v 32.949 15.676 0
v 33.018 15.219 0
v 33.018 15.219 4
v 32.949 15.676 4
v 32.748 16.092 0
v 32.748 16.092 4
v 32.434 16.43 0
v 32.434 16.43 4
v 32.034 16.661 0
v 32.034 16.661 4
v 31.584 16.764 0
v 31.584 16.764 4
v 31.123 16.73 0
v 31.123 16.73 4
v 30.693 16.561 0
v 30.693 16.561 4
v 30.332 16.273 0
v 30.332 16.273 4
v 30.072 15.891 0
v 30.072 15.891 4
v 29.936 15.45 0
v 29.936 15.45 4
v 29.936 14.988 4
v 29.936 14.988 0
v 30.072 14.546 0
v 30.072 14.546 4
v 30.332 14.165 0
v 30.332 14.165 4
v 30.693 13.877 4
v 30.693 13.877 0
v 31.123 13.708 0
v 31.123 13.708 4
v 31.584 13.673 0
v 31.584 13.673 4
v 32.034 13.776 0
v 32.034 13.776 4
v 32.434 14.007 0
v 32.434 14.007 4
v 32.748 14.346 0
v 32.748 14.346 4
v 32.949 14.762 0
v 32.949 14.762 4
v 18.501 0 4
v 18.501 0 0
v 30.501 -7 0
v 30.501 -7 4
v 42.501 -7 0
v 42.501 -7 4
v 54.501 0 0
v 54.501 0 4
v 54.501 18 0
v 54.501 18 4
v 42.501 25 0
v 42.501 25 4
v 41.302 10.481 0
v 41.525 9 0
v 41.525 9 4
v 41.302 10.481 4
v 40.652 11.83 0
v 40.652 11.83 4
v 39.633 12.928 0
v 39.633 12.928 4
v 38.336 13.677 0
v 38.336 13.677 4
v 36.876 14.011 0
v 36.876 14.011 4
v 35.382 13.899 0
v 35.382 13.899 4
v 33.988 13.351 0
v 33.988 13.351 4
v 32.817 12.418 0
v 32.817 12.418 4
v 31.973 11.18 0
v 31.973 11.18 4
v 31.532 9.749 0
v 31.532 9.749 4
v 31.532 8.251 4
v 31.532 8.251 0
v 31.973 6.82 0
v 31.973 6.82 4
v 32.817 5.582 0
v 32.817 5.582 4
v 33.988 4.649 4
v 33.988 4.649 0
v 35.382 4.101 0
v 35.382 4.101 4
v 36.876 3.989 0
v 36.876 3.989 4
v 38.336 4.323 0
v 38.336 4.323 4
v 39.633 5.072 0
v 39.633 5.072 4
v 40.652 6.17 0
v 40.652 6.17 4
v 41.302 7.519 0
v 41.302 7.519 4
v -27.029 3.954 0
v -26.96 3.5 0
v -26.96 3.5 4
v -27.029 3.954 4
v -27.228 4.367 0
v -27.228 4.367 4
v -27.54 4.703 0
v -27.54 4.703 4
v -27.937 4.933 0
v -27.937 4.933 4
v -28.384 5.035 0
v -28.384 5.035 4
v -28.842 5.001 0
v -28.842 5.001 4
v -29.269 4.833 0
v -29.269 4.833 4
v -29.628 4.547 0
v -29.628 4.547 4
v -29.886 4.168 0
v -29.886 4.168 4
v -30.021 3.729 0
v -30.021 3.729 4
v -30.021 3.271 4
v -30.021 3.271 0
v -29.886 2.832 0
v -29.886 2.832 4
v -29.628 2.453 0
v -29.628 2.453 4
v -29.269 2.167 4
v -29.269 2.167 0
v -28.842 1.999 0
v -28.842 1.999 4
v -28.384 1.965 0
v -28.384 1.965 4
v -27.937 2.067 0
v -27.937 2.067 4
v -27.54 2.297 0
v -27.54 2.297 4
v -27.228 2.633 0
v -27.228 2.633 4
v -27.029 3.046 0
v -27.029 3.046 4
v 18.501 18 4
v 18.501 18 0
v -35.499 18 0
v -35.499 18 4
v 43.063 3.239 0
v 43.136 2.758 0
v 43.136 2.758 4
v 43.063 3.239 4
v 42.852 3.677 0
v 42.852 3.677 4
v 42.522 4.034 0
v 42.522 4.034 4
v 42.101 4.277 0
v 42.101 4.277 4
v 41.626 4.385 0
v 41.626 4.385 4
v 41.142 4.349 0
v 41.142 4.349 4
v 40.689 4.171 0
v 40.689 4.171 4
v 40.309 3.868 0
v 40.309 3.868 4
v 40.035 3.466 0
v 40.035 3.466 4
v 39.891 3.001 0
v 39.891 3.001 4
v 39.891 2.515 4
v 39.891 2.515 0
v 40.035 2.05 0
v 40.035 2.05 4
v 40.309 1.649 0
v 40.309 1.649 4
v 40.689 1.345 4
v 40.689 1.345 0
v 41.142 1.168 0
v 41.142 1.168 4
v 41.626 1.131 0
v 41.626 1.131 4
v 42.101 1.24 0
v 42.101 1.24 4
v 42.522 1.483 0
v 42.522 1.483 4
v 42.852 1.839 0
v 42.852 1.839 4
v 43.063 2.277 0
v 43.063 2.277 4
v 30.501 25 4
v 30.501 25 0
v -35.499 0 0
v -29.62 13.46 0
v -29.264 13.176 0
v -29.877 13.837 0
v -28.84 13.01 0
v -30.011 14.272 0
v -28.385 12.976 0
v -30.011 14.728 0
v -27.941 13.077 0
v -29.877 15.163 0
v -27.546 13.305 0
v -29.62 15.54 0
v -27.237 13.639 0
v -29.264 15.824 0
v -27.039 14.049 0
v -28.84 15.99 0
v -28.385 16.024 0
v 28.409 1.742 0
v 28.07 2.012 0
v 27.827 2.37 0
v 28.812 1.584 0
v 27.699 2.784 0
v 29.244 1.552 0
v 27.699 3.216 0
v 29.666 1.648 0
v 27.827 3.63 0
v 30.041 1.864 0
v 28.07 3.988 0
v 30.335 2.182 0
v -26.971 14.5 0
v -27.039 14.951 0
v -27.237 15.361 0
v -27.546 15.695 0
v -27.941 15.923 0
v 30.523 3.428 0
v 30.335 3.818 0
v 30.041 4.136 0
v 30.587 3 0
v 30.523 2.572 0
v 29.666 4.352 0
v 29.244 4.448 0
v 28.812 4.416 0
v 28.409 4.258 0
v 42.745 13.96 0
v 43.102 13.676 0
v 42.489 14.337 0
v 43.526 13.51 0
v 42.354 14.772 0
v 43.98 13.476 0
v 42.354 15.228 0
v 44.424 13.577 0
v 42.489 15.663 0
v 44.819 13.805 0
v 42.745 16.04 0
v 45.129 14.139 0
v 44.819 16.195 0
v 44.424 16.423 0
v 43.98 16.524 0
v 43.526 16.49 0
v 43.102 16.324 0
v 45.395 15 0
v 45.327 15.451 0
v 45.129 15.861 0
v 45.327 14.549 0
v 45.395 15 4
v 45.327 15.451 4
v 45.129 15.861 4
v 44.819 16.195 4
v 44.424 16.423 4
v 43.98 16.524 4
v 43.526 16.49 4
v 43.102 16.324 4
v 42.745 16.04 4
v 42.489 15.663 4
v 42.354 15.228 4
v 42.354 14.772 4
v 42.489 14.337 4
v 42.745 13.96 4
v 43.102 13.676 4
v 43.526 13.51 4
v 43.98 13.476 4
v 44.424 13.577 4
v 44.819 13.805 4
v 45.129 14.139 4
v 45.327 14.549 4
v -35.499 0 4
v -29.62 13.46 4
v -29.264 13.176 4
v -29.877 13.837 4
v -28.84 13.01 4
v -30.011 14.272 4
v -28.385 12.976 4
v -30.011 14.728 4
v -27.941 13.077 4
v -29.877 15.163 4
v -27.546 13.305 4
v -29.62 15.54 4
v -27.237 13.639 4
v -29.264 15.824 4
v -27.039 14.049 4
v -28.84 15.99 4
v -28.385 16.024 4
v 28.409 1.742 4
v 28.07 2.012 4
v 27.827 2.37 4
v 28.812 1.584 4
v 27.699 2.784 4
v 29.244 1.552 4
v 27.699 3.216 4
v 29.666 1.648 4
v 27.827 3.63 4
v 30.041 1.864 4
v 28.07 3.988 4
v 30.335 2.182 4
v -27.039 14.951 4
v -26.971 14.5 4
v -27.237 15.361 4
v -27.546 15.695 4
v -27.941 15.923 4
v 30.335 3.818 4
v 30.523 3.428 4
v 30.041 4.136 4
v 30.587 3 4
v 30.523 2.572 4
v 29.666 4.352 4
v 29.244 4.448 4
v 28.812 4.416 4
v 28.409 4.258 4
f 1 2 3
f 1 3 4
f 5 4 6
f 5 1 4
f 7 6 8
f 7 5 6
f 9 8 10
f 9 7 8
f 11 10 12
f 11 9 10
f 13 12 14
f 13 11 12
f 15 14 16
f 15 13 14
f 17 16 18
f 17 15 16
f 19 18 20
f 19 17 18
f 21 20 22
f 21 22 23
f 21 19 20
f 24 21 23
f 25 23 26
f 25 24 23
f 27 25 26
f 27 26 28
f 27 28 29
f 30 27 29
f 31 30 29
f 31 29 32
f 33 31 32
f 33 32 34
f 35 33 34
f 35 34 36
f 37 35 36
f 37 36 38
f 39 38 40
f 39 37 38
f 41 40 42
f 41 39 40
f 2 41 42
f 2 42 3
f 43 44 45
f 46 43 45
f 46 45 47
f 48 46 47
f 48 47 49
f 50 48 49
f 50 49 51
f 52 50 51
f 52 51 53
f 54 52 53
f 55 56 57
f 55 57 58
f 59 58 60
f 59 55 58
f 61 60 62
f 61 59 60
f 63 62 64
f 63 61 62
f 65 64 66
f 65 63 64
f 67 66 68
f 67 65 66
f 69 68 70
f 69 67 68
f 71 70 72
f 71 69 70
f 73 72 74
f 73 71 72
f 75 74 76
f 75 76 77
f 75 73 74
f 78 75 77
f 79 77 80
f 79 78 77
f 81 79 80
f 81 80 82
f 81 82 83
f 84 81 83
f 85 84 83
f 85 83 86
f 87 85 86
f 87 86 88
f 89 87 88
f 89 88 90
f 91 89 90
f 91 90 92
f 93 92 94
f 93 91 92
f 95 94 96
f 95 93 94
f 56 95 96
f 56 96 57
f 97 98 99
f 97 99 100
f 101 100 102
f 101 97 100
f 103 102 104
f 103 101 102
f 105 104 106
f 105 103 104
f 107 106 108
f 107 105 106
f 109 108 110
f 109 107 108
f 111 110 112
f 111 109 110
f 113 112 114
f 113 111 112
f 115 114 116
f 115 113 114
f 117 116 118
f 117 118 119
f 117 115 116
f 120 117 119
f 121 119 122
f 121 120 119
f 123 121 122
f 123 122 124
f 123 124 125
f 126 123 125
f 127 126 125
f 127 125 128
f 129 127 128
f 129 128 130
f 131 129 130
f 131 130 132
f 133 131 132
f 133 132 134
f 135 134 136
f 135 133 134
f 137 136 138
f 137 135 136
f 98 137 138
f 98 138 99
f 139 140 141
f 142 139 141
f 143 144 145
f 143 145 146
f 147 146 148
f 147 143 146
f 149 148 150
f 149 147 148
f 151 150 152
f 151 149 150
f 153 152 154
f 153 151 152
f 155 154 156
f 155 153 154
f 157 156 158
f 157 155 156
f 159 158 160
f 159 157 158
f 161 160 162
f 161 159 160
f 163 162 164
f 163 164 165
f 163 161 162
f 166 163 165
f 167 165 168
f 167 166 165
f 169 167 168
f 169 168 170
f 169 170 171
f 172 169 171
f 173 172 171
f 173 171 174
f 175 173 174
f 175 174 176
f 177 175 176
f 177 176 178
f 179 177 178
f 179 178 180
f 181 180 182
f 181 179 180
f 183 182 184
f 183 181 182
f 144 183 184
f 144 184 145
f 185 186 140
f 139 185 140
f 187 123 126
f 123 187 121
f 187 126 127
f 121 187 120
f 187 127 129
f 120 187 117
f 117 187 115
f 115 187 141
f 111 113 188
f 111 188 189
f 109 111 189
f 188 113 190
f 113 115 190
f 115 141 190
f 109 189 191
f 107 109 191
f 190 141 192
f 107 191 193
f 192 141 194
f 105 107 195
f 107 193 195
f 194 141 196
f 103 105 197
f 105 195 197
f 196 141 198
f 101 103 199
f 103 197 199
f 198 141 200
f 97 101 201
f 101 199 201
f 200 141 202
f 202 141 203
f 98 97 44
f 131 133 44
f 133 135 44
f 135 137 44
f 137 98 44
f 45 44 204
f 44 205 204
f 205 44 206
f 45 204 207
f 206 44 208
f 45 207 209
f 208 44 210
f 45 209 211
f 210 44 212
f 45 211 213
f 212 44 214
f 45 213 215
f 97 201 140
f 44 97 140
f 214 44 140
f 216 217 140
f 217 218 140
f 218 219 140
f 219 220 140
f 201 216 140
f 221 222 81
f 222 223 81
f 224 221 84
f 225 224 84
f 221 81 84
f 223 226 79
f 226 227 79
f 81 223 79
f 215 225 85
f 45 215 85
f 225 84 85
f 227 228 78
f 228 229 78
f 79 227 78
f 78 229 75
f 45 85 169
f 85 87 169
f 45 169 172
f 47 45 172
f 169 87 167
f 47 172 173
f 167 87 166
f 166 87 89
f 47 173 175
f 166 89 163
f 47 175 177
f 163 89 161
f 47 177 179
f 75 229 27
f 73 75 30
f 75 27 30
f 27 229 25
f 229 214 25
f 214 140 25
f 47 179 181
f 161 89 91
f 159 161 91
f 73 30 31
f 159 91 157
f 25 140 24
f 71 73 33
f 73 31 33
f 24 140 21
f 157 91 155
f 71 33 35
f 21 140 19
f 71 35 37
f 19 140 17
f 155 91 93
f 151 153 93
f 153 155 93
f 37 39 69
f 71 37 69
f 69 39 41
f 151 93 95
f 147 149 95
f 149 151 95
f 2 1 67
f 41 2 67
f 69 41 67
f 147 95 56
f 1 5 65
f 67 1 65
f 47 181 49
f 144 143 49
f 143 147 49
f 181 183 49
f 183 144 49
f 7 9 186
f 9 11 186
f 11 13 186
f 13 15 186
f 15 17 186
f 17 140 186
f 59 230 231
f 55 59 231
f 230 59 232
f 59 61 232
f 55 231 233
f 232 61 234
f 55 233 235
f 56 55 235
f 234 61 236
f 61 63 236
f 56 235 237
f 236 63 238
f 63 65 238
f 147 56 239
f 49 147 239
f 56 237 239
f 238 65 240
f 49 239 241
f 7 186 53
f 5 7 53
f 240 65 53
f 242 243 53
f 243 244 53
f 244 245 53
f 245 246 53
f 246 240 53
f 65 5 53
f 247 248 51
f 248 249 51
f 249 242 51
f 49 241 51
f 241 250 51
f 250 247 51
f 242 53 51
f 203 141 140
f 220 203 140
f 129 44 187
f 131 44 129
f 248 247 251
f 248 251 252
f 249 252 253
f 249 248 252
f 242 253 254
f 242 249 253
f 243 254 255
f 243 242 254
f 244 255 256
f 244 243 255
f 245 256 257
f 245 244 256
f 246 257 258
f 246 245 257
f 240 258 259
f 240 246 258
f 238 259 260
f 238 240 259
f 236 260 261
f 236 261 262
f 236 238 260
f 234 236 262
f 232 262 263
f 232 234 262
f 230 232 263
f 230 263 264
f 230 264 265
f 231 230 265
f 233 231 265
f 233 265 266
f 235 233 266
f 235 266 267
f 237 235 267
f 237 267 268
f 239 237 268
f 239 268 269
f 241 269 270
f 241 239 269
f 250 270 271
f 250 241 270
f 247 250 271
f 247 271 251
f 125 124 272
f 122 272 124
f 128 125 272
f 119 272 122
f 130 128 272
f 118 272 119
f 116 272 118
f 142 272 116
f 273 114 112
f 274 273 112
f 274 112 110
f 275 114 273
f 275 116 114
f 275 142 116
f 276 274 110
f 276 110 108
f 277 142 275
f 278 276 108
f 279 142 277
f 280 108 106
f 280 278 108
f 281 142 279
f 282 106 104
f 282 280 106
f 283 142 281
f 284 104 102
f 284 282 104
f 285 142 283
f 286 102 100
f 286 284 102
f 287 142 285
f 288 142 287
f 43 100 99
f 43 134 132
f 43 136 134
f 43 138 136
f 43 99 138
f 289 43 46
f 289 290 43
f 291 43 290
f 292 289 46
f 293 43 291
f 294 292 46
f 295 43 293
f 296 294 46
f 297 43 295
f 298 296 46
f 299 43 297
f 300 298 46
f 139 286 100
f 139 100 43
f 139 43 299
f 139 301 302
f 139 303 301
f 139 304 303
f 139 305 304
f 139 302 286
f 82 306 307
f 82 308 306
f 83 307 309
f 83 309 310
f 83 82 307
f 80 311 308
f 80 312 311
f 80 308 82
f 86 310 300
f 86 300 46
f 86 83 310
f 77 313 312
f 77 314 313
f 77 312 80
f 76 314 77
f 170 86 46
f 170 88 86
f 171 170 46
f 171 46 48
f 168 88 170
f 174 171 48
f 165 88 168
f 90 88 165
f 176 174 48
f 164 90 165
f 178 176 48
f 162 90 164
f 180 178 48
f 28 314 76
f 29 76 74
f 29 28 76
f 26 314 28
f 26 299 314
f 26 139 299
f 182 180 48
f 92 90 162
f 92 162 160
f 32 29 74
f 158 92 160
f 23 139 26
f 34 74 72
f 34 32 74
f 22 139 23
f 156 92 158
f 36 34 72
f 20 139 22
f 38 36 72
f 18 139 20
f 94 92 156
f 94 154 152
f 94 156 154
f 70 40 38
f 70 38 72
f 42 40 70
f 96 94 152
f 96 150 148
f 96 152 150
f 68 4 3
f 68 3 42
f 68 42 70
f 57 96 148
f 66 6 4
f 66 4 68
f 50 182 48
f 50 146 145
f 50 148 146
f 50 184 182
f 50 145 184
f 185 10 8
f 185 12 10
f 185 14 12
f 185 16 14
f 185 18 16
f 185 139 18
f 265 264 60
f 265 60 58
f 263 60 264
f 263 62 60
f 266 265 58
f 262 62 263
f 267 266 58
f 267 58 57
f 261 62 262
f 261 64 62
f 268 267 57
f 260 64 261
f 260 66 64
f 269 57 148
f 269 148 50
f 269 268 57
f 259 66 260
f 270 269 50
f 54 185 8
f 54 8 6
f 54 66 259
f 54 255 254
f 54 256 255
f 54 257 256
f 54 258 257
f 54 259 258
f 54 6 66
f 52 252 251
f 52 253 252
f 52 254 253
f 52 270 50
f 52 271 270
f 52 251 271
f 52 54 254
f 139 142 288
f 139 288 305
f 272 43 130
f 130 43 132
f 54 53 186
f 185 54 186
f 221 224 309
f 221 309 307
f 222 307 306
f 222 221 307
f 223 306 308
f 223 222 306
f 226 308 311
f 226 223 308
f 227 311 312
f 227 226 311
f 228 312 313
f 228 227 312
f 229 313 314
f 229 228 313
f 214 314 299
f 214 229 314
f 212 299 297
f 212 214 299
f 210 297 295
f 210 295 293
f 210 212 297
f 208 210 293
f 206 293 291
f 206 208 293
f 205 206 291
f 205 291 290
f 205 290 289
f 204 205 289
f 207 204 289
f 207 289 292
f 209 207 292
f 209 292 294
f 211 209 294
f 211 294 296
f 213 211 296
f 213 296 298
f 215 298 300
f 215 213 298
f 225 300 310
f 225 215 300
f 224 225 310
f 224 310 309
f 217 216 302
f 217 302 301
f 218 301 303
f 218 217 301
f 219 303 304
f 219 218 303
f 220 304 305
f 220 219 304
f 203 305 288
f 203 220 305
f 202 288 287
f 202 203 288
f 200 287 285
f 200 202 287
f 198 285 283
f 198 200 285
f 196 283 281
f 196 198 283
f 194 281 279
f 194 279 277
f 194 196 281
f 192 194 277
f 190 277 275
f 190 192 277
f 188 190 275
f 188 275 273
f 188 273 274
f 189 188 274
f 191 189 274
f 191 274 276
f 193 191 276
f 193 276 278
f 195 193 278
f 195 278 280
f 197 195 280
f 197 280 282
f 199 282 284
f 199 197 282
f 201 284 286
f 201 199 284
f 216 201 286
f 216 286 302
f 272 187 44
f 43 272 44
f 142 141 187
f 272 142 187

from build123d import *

# Parameters (mm, degrees)
F0_R     = 1.539144
F0_R_2   = 1.452362
F0_R_3   = 1.631379
F0_R_4   = 1.528566
F0_R_5   = 1.549722
F0_R_6   = 5.024672
F0_R_7   = 1.528565
F1_DEPTH = 4


with BuildPart() as f1:
    # F0 (on Top) → F1 (new body)
    with BuildSketch(Plane.XY):
        Polygon((18.500502, 18), (-35.499498, 18), (-35.499498, 0), (18.500502, 0), (30.500502, -7), (42.500502, -7), (54.500502, 0), (54.500502, 18), (42.500502, 25), (30.500502, 25), align=None)
        with Locations((-28.499498, 3.5)):
            Circle(F0_R, mode=Mode.SUBTRACT)
        with Locations((29.135042, 3)):
            Circle(F0_R_2, mode=Mode.SUBTRACT)
        with Locations((41.504552, 2.758247)):
            Circle(F0_R_3, mode=Mode.SUBTRACT)
        with Locations((-28.499498, 14.5)):
            Circle(F0_R_4, mode=Mode.SUBTRACT)
        with Locations((31.46798, 15.21882)):
            Circle(F0_R_5, mode=Mode.SUBTRACT)
        with Locations((36.500502, 9)):
            Circle(F0_R_6, mode=Mode.SUBTRACT)
        with Locations((43.865962, 15)):
            Circle(F0_R_7, mode=Mode.SUBTRACT)
    extrude(amount=F1_DEPTH)


solid = f1.part
